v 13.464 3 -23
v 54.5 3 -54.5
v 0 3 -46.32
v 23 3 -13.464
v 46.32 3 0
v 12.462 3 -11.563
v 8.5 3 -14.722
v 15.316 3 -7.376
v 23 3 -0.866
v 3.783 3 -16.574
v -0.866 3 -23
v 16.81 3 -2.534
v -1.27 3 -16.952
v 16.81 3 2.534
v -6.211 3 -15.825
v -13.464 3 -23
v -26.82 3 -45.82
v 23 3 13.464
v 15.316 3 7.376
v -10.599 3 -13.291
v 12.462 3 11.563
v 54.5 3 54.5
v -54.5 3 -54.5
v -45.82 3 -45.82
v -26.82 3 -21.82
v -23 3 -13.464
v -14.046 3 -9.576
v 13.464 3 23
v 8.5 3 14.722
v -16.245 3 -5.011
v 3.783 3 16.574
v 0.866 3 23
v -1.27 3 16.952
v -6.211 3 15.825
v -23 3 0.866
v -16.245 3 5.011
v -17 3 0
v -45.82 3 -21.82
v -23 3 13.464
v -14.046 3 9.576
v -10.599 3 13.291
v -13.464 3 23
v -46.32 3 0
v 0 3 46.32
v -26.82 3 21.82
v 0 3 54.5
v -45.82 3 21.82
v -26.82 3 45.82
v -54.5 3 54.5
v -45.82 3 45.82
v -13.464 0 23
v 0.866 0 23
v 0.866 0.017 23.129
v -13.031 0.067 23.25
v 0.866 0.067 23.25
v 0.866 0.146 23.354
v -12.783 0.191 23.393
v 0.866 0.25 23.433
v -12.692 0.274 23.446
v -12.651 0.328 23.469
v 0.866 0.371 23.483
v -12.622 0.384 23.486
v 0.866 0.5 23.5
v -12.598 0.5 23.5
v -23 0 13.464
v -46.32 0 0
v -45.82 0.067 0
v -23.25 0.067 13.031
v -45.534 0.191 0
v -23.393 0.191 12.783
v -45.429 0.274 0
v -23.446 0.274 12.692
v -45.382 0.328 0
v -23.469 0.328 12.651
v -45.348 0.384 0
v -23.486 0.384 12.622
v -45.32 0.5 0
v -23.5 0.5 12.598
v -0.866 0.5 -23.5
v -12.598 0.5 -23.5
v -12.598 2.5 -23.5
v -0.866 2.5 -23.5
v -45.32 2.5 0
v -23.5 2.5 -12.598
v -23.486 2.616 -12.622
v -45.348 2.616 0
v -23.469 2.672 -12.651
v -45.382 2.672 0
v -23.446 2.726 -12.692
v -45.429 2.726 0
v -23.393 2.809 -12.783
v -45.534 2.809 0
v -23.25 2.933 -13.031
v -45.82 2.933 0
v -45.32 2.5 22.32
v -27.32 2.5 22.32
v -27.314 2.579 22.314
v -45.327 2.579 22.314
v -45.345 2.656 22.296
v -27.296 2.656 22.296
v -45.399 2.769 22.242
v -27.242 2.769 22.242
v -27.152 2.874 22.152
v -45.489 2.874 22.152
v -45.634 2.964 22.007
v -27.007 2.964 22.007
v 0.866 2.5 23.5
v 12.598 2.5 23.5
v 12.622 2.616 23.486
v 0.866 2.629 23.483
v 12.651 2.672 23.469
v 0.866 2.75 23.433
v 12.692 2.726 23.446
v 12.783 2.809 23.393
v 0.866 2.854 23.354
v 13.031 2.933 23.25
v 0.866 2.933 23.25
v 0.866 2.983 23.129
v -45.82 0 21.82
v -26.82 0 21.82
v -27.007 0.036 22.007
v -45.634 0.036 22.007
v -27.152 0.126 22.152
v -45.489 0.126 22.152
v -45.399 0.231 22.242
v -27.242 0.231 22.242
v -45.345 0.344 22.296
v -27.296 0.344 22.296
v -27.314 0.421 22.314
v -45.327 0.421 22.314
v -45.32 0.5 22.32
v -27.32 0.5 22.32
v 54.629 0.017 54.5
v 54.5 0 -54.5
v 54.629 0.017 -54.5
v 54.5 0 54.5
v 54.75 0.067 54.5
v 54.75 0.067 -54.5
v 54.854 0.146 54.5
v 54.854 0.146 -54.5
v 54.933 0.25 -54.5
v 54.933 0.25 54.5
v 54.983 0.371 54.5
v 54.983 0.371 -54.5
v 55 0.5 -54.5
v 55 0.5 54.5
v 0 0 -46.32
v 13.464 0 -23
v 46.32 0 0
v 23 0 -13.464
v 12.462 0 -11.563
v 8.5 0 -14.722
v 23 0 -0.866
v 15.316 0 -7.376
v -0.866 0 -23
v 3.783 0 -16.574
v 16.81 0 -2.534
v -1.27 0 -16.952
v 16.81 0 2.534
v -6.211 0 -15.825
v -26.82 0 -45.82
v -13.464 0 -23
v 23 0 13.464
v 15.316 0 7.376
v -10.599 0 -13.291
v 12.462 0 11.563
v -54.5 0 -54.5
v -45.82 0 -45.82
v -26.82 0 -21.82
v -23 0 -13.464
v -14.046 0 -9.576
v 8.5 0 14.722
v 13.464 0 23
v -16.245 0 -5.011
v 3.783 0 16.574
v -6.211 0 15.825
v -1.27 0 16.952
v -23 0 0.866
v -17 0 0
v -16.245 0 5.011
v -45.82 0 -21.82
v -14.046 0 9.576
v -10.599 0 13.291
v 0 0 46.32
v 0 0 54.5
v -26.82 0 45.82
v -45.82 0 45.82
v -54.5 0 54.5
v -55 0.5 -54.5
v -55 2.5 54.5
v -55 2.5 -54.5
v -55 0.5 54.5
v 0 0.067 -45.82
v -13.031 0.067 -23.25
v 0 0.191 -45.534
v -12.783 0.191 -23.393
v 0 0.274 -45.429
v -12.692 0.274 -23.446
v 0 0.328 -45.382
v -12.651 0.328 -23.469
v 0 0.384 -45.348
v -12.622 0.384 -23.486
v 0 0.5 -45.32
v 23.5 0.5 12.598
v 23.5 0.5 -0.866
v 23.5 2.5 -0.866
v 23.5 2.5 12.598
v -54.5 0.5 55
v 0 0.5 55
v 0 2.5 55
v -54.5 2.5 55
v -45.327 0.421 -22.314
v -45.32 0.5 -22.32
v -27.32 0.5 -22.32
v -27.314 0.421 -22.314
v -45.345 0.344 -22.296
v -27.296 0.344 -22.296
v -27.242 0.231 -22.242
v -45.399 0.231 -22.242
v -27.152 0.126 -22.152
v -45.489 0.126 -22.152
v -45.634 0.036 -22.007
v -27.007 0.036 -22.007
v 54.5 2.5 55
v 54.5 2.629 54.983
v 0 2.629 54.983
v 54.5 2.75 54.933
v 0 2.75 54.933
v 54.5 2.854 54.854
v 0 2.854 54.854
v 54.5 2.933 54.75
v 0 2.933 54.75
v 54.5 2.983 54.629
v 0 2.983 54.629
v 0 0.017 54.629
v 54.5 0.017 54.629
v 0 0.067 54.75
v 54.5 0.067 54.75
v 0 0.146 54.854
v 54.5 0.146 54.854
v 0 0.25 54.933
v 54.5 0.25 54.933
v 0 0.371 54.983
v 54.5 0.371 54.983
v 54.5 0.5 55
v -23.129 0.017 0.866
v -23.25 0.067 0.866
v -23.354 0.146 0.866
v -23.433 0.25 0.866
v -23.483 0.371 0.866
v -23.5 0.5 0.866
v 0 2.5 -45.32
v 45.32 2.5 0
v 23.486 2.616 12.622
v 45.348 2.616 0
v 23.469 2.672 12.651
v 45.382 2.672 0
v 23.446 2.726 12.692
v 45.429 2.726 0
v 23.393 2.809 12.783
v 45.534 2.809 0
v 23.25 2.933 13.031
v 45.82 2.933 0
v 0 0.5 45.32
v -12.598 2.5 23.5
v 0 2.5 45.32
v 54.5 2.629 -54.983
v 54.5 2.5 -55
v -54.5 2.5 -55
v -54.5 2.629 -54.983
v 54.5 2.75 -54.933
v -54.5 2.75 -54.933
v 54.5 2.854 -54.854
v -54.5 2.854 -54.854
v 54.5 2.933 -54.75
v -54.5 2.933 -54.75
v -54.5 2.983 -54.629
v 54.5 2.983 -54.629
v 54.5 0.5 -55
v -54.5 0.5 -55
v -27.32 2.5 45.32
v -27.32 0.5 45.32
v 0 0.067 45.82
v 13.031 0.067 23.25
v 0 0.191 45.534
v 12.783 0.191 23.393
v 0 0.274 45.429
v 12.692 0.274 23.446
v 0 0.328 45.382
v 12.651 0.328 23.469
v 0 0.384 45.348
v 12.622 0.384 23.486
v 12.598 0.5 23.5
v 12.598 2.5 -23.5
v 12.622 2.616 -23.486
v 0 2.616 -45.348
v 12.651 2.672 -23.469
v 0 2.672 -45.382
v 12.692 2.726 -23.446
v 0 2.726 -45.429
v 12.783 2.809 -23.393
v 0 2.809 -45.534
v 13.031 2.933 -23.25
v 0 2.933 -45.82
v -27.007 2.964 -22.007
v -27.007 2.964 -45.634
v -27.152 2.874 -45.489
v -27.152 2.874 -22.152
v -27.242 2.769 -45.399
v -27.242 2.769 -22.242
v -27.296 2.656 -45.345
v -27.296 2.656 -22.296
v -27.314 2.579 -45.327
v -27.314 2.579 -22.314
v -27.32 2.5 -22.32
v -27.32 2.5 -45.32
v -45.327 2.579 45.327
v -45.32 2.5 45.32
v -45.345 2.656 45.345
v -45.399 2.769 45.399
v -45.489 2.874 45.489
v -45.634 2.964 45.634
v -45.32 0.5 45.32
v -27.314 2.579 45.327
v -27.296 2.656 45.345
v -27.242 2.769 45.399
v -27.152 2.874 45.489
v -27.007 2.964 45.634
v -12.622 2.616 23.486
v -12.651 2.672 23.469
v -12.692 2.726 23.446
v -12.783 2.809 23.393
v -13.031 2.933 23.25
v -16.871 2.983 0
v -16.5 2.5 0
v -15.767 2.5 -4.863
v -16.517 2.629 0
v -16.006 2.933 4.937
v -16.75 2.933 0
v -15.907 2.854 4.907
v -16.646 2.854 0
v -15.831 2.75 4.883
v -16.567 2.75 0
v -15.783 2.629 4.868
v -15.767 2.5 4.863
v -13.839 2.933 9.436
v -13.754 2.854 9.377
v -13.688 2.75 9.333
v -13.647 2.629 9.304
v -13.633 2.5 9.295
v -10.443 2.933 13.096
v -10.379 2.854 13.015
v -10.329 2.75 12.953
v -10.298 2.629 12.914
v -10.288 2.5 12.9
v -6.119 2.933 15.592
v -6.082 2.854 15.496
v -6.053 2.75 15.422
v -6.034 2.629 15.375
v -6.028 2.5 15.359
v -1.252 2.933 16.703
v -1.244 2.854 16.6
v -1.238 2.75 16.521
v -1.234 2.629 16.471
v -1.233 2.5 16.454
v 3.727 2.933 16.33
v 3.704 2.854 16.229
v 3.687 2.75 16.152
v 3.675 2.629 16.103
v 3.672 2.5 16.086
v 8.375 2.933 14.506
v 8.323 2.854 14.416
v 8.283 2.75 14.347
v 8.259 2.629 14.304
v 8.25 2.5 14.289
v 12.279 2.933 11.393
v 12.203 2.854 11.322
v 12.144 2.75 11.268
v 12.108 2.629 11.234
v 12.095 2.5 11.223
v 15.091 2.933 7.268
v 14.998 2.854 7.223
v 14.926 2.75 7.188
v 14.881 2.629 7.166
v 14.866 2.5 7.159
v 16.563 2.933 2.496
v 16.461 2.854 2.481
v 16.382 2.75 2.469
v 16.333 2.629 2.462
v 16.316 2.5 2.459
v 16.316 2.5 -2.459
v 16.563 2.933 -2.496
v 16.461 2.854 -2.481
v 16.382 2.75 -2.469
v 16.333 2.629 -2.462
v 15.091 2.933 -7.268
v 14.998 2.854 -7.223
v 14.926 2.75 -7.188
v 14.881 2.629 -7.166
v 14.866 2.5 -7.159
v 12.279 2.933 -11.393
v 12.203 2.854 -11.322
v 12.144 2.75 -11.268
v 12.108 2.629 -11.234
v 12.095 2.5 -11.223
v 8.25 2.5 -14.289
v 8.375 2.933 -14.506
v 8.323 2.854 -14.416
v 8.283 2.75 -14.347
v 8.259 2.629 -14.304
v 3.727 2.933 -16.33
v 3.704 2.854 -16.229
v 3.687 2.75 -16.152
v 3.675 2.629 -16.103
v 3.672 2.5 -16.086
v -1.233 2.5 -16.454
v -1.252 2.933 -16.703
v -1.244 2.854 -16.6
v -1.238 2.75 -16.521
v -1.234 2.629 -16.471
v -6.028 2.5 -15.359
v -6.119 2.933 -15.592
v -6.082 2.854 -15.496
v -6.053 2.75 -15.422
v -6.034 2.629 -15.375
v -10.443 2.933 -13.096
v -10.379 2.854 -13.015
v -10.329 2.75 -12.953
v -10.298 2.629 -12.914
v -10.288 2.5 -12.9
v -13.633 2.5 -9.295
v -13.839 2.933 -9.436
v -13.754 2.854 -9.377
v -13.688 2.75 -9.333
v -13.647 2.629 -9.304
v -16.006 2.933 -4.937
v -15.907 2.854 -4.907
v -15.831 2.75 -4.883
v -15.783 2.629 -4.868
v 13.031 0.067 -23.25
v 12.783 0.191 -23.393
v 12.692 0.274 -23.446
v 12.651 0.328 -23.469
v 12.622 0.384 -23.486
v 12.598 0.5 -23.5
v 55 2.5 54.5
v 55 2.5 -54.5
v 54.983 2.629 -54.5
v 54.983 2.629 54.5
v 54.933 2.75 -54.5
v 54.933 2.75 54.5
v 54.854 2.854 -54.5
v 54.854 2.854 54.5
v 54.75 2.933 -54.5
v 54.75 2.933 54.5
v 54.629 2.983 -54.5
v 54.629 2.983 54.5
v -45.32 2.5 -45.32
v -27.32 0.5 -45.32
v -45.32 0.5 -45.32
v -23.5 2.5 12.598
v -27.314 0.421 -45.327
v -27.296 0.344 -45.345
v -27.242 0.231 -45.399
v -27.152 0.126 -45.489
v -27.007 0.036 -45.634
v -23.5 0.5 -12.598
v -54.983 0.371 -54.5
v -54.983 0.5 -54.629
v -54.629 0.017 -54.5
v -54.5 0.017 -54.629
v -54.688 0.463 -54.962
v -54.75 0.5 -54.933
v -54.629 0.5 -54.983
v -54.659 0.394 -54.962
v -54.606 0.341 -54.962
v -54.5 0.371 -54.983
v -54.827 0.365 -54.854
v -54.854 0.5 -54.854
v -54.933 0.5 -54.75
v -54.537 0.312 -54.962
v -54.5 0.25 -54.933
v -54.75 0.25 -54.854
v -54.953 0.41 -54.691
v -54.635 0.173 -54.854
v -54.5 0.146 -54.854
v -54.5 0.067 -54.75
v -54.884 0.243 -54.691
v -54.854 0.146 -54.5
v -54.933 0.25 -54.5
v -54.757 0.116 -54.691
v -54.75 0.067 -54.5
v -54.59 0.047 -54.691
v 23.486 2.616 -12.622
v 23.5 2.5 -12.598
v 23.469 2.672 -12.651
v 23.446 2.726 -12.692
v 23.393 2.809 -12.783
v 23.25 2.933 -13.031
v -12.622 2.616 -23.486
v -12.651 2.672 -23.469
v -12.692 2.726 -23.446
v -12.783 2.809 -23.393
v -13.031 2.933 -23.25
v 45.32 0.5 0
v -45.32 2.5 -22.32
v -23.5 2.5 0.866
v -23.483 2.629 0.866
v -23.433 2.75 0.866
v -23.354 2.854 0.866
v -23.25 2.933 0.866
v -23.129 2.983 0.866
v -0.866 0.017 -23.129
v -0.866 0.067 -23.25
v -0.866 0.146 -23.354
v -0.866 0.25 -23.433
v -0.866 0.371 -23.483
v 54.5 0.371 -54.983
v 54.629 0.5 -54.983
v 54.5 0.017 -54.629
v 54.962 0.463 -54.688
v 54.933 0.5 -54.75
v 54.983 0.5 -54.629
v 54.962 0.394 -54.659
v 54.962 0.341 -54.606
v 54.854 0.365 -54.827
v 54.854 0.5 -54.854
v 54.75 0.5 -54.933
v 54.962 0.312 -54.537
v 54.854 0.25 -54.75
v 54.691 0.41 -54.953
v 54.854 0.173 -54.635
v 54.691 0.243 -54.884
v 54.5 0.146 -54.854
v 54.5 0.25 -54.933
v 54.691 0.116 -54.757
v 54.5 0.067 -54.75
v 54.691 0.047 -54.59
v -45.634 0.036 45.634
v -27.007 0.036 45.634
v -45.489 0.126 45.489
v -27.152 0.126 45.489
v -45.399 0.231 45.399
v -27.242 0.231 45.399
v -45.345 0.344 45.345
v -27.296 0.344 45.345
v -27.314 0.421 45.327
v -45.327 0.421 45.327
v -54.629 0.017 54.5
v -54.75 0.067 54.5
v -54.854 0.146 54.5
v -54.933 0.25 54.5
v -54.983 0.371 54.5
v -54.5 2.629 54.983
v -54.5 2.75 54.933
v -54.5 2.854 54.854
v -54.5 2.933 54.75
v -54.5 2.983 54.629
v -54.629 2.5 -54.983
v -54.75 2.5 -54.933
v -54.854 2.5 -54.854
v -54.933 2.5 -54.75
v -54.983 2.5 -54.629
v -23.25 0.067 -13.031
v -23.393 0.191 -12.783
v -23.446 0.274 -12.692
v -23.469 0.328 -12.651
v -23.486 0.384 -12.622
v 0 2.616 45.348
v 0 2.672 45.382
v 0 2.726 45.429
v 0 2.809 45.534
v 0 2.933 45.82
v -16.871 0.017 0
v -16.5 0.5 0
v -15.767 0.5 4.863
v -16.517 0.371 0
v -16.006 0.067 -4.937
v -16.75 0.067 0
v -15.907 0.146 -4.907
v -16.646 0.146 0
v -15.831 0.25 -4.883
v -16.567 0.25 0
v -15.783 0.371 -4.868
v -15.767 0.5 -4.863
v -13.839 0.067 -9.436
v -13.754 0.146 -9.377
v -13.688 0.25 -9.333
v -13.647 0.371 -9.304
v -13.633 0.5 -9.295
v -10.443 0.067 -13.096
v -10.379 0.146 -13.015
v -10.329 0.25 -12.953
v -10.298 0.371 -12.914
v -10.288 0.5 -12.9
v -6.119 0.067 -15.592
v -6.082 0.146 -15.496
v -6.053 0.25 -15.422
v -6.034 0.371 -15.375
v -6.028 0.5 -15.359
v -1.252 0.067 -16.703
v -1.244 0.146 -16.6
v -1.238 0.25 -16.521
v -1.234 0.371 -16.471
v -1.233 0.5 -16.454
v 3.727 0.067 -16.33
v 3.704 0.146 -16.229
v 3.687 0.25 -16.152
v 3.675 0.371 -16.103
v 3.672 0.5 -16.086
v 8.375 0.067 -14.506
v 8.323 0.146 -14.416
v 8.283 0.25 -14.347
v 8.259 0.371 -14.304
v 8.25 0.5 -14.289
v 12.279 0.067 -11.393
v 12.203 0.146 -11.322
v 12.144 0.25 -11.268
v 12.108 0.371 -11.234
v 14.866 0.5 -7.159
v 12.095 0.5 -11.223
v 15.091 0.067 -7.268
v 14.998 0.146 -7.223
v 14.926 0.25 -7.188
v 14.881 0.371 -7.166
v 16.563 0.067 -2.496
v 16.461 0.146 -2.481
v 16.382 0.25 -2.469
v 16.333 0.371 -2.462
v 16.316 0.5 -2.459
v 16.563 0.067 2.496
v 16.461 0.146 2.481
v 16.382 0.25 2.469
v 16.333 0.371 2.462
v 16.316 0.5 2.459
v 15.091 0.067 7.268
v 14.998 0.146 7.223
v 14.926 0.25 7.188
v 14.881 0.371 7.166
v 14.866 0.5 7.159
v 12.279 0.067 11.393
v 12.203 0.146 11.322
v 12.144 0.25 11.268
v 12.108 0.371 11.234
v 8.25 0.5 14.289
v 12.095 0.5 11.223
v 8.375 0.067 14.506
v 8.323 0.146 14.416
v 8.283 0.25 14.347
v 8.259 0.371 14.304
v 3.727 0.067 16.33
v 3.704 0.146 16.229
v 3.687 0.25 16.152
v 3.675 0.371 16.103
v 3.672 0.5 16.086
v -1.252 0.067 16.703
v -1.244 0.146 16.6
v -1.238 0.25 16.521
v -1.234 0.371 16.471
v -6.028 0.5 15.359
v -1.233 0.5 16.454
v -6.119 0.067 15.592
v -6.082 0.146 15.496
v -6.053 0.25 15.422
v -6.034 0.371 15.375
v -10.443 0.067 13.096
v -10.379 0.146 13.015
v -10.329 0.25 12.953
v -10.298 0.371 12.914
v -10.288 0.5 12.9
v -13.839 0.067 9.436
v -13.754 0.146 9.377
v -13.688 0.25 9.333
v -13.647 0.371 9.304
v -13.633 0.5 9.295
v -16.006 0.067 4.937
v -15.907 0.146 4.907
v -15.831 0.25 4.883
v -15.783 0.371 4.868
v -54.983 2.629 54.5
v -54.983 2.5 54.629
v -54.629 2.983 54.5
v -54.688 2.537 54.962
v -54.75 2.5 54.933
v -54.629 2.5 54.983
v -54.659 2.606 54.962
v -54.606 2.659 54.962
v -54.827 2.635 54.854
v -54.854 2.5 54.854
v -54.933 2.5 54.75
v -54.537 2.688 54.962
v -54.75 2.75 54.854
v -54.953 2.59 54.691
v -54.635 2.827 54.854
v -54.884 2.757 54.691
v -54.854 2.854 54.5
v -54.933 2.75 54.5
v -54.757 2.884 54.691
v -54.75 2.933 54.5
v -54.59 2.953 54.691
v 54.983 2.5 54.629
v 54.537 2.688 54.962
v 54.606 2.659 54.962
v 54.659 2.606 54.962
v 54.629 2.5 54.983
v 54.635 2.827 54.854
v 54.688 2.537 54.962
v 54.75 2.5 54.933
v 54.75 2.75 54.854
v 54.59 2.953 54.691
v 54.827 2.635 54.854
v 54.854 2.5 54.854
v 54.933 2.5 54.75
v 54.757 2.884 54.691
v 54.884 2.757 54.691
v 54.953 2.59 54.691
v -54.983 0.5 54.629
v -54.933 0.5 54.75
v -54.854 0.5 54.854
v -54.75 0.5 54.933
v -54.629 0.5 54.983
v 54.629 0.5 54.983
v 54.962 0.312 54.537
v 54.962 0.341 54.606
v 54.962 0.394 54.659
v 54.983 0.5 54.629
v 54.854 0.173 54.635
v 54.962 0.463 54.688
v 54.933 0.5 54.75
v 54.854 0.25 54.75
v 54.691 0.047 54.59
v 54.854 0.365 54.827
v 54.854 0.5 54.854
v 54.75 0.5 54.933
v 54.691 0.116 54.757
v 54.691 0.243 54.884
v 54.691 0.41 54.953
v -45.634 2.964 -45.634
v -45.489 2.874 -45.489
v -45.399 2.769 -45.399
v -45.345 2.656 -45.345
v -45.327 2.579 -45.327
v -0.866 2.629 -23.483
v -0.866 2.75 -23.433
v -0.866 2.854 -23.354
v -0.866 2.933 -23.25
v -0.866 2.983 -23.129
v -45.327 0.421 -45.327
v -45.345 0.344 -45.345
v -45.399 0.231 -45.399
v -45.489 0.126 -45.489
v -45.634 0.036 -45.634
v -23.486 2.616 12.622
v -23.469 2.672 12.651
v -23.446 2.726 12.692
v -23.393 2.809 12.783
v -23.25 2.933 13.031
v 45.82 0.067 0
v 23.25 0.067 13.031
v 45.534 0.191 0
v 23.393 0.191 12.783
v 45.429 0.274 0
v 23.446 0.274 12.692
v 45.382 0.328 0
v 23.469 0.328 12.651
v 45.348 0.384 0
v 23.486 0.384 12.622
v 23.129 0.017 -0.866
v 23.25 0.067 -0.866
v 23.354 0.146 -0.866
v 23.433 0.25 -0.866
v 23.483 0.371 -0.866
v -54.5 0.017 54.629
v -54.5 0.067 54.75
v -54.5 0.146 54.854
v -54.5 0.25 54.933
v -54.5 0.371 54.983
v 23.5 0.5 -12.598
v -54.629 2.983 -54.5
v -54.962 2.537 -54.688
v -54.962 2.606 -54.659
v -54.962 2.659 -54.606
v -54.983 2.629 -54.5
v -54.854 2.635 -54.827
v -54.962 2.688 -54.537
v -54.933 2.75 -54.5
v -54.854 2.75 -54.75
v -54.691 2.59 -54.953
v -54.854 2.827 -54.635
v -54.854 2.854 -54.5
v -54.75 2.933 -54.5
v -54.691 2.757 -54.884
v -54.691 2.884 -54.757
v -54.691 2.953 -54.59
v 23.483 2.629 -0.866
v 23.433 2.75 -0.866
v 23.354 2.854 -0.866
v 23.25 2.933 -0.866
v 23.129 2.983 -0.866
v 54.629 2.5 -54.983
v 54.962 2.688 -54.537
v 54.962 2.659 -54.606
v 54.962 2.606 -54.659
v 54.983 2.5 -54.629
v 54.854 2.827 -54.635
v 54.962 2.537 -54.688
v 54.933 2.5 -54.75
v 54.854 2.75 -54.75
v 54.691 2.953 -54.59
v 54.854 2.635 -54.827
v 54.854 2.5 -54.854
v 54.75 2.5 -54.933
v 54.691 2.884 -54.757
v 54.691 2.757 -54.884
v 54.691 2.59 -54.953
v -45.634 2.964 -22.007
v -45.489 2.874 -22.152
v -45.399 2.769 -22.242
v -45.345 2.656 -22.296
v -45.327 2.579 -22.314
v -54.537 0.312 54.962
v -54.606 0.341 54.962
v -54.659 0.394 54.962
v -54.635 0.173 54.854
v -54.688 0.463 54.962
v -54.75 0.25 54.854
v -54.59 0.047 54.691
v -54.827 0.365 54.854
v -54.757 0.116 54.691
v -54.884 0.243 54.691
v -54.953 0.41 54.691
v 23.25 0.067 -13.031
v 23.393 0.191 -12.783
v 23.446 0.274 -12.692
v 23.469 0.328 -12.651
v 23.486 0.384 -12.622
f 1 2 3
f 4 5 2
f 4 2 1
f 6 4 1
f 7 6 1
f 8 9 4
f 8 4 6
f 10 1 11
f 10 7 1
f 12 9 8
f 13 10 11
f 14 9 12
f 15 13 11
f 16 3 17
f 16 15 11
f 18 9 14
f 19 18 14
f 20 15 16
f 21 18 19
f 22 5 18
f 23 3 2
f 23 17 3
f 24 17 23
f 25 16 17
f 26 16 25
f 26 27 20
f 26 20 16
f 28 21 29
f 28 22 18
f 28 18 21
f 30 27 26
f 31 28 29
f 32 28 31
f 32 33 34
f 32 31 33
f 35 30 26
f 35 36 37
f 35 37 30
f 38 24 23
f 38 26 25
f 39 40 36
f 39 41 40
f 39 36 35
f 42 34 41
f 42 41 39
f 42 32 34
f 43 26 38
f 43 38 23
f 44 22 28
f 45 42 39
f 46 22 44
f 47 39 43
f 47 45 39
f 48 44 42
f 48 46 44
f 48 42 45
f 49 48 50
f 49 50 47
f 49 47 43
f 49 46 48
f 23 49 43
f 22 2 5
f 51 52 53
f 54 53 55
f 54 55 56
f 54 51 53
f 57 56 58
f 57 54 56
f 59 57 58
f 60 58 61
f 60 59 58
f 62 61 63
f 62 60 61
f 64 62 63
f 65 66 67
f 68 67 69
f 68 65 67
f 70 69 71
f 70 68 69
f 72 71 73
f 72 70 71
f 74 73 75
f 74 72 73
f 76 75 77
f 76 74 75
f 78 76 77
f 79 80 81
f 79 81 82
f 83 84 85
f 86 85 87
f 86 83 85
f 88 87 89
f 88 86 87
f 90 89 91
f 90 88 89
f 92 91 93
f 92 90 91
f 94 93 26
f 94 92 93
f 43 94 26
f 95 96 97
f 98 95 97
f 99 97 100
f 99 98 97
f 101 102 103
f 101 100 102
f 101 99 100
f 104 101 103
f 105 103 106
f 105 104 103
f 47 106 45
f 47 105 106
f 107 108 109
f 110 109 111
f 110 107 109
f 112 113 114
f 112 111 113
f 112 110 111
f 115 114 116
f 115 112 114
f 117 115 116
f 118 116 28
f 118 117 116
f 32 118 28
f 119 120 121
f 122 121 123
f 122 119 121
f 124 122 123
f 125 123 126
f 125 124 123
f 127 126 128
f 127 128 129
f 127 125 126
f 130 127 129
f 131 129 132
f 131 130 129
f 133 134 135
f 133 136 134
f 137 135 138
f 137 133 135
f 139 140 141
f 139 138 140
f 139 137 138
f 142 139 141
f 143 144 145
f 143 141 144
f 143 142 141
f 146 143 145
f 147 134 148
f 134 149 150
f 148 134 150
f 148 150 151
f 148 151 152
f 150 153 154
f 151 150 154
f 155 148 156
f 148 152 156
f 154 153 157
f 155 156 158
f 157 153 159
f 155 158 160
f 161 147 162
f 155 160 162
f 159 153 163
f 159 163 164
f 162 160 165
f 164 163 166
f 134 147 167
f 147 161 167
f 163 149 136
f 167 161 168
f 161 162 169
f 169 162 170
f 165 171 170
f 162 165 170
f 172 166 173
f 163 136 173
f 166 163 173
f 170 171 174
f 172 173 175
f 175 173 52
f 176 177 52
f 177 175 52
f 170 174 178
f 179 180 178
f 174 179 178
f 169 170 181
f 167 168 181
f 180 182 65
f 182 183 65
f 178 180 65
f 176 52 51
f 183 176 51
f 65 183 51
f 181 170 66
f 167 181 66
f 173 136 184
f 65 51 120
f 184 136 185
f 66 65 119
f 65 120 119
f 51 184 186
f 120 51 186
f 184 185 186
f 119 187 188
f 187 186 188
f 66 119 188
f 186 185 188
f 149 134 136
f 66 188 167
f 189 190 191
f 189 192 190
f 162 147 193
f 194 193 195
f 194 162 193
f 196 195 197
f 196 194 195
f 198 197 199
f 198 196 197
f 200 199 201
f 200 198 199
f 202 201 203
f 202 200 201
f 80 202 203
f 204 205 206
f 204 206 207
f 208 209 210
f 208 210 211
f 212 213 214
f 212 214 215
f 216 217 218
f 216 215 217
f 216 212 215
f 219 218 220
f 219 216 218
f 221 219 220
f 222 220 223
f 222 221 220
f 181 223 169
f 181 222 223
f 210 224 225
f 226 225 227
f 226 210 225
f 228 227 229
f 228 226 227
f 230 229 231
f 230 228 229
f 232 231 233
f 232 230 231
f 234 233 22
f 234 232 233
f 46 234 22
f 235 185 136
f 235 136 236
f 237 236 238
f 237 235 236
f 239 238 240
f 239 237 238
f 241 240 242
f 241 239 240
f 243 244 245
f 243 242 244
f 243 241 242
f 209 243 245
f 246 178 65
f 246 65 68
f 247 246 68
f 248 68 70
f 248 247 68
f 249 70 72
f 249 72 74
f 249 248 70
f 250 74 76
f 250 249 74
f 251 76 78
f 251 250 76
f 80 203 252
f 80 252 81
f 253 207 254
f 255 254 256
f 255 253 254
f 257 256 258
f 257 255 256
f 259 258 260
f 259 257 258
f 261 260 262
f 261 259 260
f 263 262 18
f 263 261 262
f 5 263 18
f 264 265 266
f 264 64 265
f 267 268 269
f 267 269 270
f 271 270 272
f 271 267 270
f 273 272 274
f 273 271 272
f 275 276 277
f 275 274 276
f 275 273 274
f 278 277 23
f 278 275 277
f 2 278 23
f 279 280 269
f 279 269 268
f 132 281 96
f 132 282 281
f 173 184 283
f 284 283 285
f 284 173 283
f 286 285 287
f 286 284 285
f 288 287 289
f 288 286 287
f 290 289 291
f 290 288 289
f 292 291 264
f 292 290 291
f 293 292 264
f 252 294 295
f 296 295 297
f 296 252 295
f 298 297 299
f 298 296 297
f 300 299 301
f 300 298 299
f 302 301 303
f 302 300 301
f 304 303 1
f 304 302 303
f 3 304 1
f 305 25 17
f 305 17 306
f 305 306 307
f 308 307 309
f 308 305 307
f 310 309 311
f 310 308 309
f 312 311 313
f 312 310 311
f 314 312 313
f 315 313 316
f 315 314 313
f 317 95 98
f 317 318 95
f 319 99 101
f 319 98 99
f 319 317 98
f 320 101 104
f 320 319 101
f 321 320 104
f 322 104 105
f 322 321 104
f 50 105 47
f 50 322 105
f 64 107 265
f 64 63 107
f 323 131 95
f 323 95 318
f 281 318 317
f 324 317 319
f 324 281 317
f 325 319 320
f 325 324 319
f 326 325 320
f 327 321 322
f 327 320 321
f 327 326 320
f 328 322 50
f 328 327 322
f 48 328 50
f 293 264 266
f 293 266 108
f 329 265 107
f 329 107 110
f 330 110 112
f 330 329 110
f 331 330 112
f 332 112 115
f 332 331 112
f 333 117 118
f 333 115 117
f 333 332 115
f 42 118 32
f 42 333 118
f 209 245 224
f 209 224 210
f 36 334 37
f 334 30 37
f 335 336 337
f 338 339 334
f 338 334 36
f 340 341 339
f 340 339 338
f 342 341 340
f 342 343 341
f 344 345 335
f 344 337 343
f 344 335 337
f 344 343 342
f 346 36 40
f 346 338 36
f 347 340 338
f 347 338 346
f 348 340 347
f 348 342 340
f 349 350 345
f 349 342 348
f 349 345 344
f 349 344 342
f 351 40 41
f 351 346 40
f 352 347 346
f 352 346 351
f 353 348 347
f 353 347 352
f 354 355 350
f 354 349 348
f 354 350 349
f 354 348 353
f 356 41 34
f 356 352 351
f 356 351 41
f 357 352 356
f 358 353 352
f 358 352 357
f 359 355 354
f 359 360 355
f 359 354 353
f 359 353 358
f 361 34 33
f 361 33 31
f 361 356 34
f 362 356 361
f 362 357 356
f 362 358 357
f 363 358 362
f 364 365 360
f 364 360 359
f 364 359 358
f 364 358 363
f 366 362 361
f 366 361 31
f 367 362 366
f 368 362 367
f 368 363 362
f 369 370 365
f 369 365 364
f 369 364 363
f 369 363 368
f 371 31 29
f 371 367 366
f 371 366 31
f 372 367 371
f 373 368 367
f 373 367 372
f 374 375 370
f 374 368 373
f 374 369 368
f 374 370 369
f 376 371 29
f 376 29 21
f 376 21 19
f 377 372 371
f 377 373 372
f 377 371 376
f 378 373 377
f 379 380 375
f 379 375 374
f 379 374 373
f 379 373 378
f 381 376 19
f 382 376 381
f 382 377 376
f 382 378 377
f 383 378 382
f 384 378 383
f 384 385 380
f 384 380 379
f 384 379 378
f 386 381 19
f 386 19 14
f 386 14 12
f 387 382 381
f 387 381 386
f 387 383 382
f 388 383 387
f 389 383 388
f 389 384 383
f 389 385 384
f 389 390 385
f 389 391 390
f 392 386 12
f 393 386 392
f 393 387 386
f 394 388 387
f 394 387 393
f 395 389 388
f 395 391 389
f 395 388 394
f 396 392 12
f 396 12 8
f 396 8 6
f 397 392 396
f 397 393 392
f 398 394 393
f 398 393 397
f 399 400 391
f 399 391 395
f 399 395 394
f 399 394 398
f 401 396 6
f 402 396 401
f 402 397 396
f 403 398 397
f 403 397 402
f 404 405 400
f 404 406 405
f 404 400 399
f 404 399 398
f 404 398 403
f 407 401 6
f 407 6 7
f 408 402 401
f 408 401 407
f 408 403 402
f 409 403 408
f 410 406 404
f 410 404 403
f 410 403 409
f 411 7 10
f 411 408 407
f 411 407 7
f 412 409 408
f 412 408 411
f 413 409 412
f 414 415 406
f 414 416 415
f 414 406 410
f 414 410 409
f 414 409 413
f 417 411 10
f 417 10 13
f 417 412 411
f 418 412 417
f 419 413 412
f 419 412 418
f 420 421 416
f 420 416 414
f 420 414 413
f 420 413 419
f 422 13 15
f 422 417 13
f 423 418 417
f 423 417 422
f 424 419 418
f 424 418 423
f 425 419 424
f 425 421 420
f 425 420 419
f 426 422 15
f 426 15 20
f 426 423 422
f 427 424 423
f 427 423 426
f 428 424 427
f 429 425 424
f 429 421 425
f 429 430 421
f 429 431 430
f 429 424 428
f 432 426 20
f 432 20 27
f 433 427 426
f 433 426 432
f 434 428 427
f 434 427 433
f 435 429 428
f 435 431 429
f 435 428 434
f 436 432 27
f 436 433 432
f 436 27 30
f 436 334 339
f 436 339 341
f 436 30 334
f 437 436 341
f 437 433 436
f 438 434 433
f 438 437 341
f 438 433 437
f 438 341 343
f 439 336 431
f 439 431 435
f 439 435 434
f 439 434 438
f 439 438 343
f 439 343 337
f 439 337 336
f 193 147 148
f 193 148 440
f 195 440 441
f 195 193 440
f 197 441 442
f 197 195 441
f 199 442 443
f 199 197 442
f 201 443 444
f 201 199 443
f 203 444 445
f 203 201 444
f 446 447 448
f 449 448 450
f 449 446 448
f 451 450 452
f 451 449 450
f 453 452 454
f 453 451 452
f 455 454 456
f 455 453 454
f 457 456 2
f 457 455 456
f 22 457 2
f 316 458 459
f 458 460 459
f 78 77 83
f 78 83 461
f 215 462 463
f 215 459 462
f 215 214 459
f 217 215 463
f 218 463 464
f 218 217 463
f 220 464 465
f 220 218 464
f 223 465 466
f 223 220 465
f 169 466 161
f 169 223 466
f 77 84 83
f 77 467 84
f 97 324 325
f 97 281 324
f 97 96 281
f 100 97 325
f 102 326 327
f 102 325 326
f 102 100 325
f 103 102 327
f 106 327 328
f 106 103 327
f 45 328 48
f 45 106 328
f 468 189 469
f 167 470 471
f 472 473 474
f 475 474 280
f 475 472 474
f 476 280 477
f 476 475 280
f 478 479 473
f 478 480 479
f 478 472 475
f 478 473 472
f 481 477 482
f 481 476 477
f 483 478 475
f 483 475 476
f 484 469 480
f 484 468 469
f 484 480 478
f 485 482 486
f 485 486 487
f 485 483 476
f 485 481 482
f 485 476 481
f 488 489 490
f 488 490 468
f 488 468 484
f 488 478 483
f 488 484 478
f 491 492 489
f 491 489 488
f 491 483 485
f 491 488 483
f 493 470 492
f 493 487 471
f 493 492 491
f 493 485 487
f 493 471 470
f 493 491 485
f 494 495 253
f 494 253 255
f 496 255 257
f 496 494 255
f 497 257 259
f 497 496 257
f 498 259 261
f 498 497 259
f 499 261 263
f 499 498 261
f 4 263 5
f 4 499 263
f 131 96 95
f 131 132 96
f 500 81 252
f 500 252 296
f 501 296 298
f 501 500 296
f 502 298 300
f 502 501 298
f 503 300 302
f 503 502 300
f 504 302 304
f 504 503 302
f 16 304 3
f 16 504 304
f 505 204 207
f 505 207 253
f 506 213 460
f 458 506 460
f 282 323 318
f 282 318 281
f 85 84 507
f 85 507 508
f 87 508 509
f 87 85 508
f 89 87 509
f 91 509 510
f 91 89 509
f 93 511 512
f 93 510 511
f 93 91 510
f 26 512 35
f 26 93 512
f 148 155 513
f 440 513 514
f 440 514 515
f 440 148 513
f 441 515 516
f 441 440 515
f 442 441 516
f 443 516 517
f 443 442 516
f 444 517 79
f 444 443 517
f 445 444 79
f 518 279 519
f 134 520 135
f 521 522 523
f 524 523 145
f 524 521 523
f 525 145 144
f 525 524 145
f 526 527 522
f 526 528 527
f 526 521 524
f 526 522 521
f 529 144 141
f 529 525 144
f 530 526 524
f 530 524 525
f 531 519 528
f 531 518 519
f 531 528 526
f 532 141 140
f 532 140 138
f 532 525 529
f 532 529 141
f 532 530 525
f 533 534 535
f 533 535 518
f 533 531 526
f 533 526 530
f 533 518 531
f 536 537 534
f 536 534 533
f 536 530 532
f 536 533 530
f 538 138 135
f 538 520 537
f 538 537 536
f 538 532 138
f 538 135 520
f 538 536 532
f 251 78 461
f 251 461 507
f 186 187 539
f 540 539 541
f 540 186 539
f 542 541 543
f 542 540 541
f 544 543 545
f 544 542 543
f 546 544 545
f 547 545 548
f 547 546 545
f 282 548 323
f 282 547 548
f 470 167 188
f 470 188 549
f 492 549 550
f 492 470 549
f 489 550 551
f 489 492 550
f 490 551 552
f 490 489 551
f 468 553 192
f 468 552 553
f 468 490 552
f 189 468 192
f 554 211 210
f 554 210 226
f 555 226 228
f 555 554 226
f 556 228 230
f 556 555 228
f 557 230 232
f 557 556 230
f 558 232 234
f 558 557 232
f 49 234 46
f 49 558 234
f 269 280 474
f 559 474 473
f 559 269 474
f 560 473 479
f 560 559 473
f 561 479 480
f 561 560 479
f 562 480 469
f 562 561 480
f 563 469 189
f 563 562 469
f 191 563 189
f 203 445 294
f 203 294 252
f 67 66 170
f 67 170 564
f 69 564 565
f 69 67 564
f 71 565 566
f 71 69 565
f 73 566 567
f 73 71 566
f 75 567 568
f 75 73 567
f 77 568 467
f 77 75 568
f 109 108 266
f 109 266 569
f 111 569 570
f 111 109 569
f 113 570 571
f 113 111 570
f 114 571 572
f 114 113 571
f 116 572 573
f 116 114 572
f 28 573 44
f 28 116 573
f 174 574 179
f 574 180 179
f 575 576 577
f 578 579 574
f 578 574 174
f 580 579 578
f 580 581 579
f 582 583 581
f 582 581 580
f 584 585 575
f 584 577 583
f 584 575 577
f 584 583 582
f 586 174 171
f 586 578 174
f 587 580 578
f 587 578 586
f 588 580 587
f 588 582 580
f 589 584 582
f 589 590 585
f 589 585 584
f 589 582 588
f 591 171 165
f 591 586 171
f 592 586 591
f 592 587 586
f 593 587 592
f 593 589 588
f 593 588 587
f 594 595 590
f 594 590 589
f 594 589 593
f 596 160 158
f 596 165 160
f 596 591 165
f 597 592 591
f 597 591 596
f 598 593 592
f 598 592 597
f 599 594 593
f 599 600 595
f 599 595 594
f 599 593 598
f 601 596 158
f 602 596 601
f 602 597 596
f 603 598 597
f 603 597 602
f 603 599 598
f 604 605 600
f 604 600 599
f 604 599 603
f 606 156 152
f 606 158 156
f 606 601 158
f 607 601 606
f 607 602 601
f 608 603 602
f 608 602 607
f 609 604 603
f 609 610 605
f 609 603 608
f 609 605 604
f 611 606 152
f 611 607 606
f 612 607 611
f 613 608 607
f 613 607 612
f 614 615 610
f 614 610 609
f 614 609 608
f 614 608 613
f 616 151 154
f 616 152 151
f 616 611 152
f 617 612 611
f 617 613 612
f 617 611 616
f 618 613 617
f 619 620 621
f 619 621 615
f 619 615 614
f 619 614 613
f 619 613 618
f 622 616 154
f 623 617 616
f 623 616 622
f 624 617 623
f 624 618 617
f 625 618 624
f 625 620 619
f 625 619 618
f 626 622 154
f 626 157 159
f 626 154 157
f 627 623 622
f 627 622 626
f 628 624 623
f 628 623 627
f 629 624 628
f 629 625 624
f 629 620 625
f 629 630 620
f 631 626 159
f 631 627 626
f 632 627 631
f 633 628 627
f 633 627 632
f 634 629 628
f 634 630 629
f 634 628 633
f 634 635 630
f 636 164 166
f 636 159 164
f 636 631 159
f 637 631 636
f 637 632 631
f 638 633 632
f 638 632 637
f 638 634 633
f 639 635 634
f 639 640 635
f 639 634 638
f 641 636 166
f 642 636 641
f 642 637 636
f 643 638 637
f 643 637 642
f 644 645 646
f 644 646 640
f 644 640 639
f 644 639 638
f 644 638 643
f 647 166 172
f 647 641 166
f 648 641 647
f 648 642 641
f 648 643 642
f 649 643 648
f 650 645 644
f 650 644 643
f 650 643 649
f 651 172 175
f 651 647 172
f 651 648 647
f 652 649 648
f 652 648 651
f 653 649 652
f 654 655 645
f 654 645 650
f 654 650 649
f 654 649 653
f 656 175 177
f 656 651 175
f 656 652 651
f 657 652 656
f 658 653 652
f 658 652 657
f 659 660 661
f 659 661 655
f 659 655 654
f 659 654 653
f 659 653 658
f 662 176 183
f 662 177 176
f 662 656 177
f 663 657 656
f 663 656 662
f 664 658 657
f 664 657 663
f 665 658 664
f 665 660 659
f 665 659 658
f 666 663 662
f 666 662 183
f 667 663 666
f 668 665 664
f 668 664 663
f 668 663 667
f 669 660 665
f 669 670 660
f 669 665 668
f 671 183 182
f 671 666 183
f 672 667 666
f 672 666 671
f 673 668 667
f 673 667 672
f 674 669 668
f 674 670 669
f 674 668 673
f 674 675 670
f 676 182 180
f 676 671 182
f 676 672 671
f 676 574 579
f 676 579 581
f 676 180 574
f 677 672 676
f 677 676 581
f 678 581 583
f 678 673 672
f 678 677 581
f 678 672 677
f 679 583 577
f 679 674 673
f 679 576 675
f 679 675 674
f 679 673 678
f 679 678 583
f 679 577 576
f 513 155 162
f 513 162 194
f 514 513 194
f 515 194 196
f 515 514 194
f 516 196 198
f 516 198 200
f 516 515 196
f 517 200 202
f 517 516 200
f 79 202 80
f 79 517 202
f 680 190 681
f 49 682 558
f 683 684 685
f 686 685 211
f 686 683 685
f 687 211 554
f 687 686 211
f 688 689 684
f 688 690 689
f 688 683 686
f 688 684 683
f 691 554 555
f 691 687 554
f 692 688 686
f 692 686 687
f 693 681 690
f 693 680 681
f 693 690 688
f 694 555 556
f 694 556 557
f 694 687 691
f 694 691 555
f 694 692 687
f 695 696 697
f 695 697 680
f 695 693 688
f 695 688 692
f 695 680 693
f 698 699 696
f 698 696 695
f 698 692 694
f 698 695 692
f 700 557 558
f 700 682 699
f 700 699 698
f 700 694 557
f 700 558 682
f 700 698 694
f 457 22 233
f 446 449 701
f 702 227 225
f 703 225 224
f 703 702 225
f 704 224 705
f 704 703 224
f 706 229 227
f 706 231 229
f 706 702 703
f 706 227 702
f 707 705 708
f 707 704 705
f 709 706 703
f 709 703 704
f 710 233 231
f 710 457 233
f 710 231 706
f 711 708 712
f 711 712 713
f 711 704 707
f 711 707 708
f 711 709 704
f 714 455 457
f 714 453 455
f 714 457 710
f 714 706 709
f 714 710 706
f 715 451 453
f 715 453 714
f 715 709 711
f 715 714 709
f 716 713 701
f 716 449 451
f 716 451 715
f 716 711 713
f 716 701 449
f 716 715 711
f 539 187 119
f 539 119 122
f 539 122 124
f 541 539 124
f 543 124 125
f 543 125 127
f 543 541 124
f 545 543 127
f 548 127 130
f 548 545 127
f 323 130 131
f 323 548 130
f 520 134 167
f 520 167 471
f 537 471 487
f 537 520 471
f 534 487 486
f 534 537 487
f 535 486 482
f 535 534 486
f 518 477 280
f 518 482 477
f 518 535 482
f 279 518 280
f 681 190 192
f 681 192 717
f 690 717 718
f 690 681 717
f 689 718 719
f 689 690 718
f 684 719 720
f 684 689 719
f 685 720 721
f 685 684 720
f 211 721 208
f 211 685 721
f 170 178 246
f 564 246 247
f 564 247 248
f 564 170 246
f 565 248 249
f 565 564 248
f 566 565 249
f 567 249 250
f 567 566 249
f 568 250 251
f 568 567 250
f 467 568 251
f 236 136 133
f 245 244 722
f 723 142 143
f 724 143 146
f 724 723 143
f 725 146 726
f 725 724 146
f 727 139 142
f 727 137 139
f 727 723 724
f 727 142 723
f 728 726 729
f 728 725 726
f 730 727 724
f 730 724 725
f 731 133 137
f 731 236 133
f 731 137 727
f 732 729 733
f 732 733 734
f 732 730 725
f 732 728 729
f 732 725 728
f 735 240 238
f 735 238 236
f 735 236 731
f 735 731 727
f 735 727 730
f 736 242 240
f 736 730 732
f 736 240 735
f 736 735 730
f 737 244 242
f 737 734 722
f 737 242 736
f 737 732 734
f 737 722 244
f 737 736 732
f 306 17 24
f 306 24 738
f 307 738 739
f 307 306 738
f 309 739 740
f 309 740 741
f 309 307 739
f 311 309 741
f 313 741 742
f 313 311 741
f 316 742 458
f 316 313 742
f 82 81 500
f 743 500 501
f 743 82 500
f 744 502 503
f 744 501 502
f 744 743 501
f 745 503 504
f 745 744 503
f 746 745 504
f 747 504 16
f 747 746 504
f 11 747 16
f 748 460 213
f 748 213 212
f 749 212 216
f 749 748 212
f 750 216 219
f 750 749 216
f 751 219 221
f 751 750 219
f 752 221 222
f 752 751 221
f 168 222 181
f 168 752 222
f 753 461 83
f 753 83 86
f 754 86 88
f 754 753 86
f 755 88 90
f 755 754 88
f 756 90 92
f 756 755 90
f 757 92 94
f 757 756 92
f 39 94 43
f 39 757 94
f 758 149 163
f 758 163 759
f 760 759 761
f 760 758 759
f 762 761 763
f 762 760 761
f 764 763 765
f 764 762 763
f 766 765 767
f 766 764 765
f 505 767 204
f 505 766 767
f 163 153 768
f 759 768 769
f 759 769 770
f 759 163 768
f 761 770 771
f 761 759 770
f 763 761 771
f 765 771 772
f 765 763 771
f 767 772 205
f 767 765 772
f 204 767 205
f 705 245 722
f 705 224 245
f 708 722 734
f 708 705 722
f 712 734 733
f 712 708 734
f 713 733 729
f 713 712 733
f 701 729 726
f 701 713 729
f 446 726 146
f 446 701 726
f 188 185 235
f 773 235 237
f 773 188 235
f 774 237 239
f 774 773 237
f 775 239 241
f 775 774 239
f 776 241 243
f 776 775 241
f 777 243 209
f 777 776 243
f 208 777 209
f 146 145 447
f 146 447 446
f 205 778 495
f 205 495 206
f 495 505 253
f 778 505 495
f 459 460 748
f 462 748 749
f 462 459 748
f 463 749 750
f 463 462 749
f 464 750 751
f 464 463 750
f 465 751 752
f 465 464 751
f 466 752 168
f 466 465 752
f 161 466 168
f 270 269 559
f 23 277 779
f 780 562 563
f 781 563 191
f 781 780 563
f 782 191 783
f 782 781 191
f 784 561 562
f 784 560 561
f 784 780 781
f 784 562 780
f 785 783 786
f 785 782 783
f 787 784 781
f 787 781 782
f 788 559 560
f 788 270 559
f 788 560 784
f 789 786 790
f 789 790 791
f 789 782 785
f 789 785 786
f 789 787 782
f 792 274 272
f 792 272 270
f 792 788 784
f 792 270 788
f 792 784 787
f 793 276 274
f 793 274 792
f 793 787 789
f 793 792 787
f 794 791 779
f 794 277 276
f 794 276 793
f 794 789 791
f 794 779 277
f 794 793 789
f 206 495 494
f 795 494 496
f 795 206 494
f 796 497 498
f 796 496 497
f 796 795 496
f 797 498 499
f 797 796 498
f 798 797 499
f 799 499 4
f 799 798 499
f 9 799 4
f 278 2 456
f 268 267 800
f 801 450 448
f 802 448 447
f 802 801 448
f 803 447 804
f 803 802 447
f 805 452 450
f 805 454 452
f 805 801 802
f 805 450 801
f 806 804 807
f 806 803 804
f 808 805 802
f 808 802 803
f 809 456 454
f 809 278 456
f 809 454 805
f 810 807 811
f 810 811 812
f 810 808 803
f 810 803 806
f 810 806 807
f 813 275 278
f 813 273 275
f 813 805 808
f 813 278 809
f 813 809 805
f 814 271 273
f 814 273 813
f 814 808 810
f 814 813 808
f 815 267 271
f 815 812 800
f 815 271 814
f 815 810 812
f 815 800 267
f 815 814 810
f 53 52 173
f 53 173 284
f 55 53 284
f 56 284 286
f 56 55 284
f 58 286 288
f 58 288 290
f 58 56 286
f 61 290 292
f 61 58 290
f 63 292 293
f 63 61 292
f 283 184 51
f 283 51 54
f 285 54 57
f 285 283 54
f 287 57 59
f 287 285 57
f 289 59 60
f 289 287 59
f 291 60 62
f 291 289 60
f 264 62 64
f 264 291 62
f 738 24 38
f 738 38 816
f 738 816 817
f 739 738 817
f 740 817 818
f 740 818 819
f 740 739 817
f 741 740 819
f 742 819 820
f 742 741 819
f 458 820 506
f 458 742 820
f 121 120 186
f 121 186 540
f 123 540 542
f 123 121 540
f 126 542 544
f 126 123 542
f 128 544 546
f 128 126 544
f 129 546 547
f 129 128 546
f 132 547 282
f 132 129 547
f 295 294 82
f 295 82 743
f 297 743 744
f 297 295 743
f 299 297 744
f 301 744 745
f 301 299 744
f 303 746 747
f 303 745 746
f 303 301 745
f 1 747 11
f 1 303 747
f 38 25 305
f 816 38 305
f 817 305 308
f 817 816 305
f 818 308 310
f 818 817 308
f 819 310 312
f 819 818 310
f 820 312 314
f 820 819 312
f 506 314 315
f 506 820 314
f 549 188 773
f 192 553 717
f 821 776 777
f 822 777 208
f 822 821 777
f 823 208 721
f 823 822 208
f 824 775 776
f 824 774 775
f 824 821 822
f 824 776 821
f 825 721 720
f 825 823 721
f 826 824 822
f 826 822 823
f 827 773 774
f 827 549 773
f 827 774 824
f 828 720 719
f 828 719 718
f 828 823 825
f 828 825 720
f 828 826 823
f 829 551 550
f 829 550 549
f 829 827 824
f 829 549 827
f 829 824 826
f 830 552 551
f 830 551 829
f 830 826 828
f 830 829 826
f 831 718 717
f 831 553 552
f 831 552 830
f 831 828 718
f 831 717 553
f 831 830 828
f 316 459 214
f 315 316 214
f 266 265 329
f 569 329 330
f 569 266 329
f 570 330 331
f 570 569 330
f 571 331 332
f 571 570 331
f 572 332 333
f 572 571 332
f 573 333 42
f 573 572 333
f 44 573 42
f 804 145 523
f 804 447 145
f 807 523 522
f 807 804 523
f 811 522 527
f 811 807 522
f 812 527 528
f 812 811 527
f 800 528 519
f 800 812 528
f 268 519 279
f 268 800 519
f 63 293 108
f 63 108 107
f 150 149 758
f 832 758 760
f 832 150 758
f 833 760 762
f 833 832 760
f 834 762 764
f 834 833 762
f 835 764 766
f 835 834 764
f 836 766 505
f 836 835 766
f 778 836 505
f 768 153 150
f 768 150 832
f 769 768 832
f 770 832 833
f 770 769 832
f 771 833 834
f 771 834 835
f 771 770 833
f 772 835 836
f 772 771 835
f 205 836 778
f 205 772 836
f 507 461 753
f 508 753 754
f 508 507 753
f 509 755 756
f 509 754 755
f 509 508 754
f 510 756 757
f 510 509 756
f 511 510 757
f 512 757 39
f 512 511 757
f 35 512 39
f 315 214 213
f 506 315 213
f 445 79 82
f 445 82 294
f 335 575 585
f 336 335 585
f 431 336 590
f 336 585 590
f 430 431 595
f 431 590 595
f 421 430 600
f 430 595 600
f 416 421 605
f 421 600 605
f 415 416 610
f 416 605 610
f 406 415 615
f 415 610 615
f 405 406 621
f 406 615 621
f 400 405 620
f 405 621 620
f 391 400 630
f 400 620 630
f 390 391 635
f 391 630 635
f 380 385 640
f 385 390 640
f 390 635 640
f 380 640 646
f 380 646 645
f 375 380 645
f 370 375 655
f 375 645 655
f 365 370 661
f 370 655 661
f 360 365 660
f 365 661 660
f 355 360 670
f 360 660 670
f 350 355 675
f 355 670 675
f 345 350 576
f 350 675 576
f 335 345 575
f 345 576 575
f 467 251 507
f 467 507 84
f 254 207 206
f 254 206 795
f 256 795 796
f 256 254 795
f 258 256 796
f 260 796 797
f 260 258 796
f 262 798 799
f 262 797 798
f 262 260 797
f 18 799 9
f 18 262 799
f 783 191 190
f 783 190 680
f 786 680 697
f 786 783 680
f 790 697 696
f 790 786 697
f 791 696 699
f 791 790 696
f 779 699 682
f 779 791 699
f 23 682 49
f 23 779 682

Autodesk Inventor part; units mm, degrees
ref_plane "YZ Plane" through (0, 0, 0) normal (1, 0, 0) x (0, 1, 0)
ref_plane "XZ Plane" through (0, 0, 0) normal (0, 1, 0) x (-1, 0, 0)
ref_plane "XY Plane" through (0, 0, 0) normal (0, 0, 1) x (1, 0, 0)
sketch "Sketch1" plane through (0, 0, 0) normal (0, 1, 0) x (-1, 0, 0)
  circle A0 centre (0, 0) radius 15
  line L0 (0, -25) -> (10, -25)
  line L1 (0, -25) -> (-10, -25)
  line L2 (-10, -25) -> (0, -42.3205)
  line L3 (0, -42.3205) -> (10, -25)
  circle A1 centre (0, 0) radius 16.5
  line L4 (12.5981, -23.5) -> (0.866, -23.5)
  line L5 (0.866, -23.5) -> (-12.5981, -23.5)
  line L6 (-12.5981, -23.5) -> (0, -45.3205)
  line L7 (0, -45.3205) -> (12.5981, -23.5)
  line L8 (25, 0) -> (25, 10)
  line L9 (25, 0) -> (25, -10)
  line L10 (25, -10) -> (42.3205, 0)
  line L11 (42.3205, 0) -> (25, 10)
  line L12 (23.5, 12.5981) -> (23.5, 0.866)
  line L13 (23.5, 0.866) -> (23.5, -12.5981)
  line L14 (23.5, -12.5981) -> (45.3205, 0)
  line L15 (45.3205, 0) -> (23.5, 12.5981)
  line L16 (0, 25) -> (-10, 25)
  line L17 (0, 25) -> (10, 25)
  line L18 (10, 25) -> (0, 42.3205)
  line L19 (0, 42.3205) -> (-10, 25)
  line L20 (-12.5981, 23.5) -> (-0.866, 23.5)
  line L21 (-0.866, 23.5) -> (12.5981, 23.5)
  line L22 (12.5981, 23.5) -> (0, 45.3205)
  line L23 (0, 45.3205) -> (-12.5981, 23.5)
  line L24 (-25, 0) -> (-25, -10)
  line L25 (-25, 0) -> (-25, 10)
  line L26 (-25, 10) -> (-42.3205, 0)
  line L27 (-42.3205, 0) -> (-25, -10)
  line L28 (-23.5, -12.5981) -> (-23.5, -0.866)
  line L29 (-23.5, -0.866) -> (-23.5, 12.5981)
  line L30 (-23.5, 12.5981) -> (-45.3205, 0)
  line L31 (-45.3205, 0) -> (-23.5, -12.5981)
  line L32 (45.3205, 45.3205) -> (27.3205, 45.3205)
  line L33 (27.3205, 45.3205) -> (27.3205, 22.3205)
  line L34 (27.3205, 22.3205) -> (45.3205, 22.3205)
  line L35 (45.3205, 22.3205) -> (45.3205, 45.3205)
  line L36 (28.8205, 23.8205) -> (28.8205, 43.8205)
  line L37 (28.8205, 43.8205) -> (43.8205, 43.8205)
  line L38 (43.8205, 43.8205) -> (43.8205, 23.8205)
  line L39 (43.8205, 23.8205) -> (28.8205, 23.8205)
  line L40 (45.3205, -45.3205) -> (27.3205, -45.3205)
  line L41 (27.3205, -45.3205) -> (27.3205, -22.3205)
  line L42 (27.3205, -22.3205) -> (45.3205, -22.3205)
  line L43 (45.3205, -22.3205) -> (45.3205, -45.3205)
  line L44 (28.8205, -23.8205) -> (28.8205, -43.8205)
  line L45 (28.8205, -43.8205) -> (43.8205, -43.8205)
  line L46 (43.8205, -43.8205) -> (43.8205, -23.8205)
  line L47 (43.8205, -23.8205) -> (28.8205, -23.8205)
  line L48 (0, 55) -> (55, 55)
  line L49 (55, 55) -> (55, -55)
  line L50 (55, -55) -> (-55, -55)
  line L51 (-55, -55) -> (-55, 55)
  line L52 (-55, 55) -> (0, 55)
  dimension "d1" = 10
  dimension "d2" = 10
  dimension "d3" = 20
  dimension "d4" = 60
  dimension "d6" = 1.5
  dimension "d7" = 25
  dimension "d10" = 360
  dimension "d12" = 18
  dimension "d13" = 23
  dimension "d14" = 1.5
  dimension "d16" = 55
  dimension "d17" = 110
  dimension "d18" = 110
  dimension "d19" = 110
extrude "Extrusion1" add sketch "Sketch1" along normal blind 3 contours L48 L49 L50 L51 L52
fillet "Fillet1" radius 0.5 12 edges at (0, 3, -55) (55, 3, 0) (-55, 3, 0) (27.5, 3, 55) (-55, 0, 0) (0, 0, -55) (-55, 1.5, -55) (-55, 1.5, 55) (-27.5, 0, 55) (55, 1.5, 55) (55, 0, 0) (55, 1.5, -55)
fillet "Fillet2" radius 0.5 42 edges at (16.5, 3, 0) (16.5, 0, 0) (6.299, 3, -34.4103) (5.866, 3, -23.5) (-6.299, 3, -34.4103) (-27.3205, 3, -33.8205) (-36.3205, 3, -45.3205) (-45.3205, 3, -33.8205) (-36.3205, 3, -22.3205) (-34.4103, 3, -6.299) (-34.4103, 3, 6.299) (-23.5, 3, -5.866) (-36.3205, 3, 22.3205) (-27.3205, 3, 33.8205) (-45.3205, 3, 33.8205) (-36.3205, 3, 45.3205) (-6.299, 3, 34.4103) (6.299, 3, 34.4103) (-5.866, 3, 23.5) (34.4103, 3, 6.299) (34.4103, 3, -6.299) (23.5, 3, 5.866) (-36.3205, 0, 45.3205) (-45.3205, 0, 33.8205) (-36.3205, 0, 22.3205) (-27.3205, 0, 33.8205) (-5.866, 0, 23.5) (6.299, 0, 34.4103) (-6.299, 0, 34.4103) (-34.4103, 0, -6.299) (-34.4103, 0, 6.299) (-23.5, 0, -5.866) (-45.3205, 0, -33.8205) (-36.3205, 0, -22.3205) (-27.3205, 0, -33.8205) (-36.3205, 0, -45.3205) (-6.299, 0, -34.4103) (5.866, 0, -23.5) (6.299, 0, -34.4103) (23.5, 0, 5.866) (34.4103, 0, -6.299) (34.4103, 0, 6.299)
properties part number "Mat_Tren_Button" material "Rubber"
